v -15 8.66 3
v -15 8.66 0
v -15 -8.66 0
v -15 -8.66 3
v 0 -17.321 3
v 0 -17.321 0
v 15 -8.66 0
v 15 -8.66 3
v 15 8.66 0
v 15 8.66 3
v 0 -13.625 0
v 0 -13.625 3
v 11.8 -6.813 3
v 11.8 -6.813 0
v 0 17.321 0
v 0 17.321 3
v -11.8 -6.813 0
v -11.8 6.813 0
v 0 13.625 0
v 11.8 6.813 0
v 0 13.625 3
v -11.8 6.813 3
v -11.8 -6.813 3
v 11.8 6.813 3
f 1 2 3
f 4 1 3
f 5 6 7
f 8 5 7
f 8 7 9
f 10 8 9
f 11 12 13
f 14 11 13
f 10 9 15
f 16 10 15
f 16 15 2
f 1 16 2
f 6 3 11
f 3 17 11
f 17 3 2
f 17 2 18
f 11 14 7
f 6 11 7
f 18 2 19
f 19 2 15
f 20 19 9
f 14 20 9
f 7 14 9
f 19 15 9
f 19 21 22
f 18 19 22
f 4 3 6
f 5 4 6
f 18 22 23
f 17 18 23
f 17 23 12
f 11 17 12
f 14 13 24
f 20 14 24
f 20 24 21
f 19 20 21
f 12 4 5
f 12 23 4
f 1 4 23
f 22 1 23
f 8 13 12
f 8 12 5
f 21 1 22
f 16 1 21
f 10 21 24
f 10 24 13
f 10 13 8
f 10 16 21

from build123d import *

# Parameters (mm, degrees)
F1_DEPTH = 3
F3_DEPTH = 25


with BuildPart() as f1:
    # F0 (on Top) → F1 (new body)
    with BuildSketch(Plane.XY):
        Polygon((15, -8.660254), (15, 8.660254), (0, 17.320508), (-15, 8.660254), (-15, -8.660254), (0, -17.320508), align=None)
    extrude(amount=F1_DEPTH)

    # F2 (on face) → F3 (cut)
    with BuildSketch(Plane.XY.offset(3)):
        Polygon((0, -13.625466), (11.8, -6.812733), (11.8, 6.812733), (0, 13.625466), (-11.8, 6.812733), (-11.8, -6.812733), align=None)
    extrude(amount=-F3_DEPTH, mode=Mode.SUBTRACT)


solid = f1.part
